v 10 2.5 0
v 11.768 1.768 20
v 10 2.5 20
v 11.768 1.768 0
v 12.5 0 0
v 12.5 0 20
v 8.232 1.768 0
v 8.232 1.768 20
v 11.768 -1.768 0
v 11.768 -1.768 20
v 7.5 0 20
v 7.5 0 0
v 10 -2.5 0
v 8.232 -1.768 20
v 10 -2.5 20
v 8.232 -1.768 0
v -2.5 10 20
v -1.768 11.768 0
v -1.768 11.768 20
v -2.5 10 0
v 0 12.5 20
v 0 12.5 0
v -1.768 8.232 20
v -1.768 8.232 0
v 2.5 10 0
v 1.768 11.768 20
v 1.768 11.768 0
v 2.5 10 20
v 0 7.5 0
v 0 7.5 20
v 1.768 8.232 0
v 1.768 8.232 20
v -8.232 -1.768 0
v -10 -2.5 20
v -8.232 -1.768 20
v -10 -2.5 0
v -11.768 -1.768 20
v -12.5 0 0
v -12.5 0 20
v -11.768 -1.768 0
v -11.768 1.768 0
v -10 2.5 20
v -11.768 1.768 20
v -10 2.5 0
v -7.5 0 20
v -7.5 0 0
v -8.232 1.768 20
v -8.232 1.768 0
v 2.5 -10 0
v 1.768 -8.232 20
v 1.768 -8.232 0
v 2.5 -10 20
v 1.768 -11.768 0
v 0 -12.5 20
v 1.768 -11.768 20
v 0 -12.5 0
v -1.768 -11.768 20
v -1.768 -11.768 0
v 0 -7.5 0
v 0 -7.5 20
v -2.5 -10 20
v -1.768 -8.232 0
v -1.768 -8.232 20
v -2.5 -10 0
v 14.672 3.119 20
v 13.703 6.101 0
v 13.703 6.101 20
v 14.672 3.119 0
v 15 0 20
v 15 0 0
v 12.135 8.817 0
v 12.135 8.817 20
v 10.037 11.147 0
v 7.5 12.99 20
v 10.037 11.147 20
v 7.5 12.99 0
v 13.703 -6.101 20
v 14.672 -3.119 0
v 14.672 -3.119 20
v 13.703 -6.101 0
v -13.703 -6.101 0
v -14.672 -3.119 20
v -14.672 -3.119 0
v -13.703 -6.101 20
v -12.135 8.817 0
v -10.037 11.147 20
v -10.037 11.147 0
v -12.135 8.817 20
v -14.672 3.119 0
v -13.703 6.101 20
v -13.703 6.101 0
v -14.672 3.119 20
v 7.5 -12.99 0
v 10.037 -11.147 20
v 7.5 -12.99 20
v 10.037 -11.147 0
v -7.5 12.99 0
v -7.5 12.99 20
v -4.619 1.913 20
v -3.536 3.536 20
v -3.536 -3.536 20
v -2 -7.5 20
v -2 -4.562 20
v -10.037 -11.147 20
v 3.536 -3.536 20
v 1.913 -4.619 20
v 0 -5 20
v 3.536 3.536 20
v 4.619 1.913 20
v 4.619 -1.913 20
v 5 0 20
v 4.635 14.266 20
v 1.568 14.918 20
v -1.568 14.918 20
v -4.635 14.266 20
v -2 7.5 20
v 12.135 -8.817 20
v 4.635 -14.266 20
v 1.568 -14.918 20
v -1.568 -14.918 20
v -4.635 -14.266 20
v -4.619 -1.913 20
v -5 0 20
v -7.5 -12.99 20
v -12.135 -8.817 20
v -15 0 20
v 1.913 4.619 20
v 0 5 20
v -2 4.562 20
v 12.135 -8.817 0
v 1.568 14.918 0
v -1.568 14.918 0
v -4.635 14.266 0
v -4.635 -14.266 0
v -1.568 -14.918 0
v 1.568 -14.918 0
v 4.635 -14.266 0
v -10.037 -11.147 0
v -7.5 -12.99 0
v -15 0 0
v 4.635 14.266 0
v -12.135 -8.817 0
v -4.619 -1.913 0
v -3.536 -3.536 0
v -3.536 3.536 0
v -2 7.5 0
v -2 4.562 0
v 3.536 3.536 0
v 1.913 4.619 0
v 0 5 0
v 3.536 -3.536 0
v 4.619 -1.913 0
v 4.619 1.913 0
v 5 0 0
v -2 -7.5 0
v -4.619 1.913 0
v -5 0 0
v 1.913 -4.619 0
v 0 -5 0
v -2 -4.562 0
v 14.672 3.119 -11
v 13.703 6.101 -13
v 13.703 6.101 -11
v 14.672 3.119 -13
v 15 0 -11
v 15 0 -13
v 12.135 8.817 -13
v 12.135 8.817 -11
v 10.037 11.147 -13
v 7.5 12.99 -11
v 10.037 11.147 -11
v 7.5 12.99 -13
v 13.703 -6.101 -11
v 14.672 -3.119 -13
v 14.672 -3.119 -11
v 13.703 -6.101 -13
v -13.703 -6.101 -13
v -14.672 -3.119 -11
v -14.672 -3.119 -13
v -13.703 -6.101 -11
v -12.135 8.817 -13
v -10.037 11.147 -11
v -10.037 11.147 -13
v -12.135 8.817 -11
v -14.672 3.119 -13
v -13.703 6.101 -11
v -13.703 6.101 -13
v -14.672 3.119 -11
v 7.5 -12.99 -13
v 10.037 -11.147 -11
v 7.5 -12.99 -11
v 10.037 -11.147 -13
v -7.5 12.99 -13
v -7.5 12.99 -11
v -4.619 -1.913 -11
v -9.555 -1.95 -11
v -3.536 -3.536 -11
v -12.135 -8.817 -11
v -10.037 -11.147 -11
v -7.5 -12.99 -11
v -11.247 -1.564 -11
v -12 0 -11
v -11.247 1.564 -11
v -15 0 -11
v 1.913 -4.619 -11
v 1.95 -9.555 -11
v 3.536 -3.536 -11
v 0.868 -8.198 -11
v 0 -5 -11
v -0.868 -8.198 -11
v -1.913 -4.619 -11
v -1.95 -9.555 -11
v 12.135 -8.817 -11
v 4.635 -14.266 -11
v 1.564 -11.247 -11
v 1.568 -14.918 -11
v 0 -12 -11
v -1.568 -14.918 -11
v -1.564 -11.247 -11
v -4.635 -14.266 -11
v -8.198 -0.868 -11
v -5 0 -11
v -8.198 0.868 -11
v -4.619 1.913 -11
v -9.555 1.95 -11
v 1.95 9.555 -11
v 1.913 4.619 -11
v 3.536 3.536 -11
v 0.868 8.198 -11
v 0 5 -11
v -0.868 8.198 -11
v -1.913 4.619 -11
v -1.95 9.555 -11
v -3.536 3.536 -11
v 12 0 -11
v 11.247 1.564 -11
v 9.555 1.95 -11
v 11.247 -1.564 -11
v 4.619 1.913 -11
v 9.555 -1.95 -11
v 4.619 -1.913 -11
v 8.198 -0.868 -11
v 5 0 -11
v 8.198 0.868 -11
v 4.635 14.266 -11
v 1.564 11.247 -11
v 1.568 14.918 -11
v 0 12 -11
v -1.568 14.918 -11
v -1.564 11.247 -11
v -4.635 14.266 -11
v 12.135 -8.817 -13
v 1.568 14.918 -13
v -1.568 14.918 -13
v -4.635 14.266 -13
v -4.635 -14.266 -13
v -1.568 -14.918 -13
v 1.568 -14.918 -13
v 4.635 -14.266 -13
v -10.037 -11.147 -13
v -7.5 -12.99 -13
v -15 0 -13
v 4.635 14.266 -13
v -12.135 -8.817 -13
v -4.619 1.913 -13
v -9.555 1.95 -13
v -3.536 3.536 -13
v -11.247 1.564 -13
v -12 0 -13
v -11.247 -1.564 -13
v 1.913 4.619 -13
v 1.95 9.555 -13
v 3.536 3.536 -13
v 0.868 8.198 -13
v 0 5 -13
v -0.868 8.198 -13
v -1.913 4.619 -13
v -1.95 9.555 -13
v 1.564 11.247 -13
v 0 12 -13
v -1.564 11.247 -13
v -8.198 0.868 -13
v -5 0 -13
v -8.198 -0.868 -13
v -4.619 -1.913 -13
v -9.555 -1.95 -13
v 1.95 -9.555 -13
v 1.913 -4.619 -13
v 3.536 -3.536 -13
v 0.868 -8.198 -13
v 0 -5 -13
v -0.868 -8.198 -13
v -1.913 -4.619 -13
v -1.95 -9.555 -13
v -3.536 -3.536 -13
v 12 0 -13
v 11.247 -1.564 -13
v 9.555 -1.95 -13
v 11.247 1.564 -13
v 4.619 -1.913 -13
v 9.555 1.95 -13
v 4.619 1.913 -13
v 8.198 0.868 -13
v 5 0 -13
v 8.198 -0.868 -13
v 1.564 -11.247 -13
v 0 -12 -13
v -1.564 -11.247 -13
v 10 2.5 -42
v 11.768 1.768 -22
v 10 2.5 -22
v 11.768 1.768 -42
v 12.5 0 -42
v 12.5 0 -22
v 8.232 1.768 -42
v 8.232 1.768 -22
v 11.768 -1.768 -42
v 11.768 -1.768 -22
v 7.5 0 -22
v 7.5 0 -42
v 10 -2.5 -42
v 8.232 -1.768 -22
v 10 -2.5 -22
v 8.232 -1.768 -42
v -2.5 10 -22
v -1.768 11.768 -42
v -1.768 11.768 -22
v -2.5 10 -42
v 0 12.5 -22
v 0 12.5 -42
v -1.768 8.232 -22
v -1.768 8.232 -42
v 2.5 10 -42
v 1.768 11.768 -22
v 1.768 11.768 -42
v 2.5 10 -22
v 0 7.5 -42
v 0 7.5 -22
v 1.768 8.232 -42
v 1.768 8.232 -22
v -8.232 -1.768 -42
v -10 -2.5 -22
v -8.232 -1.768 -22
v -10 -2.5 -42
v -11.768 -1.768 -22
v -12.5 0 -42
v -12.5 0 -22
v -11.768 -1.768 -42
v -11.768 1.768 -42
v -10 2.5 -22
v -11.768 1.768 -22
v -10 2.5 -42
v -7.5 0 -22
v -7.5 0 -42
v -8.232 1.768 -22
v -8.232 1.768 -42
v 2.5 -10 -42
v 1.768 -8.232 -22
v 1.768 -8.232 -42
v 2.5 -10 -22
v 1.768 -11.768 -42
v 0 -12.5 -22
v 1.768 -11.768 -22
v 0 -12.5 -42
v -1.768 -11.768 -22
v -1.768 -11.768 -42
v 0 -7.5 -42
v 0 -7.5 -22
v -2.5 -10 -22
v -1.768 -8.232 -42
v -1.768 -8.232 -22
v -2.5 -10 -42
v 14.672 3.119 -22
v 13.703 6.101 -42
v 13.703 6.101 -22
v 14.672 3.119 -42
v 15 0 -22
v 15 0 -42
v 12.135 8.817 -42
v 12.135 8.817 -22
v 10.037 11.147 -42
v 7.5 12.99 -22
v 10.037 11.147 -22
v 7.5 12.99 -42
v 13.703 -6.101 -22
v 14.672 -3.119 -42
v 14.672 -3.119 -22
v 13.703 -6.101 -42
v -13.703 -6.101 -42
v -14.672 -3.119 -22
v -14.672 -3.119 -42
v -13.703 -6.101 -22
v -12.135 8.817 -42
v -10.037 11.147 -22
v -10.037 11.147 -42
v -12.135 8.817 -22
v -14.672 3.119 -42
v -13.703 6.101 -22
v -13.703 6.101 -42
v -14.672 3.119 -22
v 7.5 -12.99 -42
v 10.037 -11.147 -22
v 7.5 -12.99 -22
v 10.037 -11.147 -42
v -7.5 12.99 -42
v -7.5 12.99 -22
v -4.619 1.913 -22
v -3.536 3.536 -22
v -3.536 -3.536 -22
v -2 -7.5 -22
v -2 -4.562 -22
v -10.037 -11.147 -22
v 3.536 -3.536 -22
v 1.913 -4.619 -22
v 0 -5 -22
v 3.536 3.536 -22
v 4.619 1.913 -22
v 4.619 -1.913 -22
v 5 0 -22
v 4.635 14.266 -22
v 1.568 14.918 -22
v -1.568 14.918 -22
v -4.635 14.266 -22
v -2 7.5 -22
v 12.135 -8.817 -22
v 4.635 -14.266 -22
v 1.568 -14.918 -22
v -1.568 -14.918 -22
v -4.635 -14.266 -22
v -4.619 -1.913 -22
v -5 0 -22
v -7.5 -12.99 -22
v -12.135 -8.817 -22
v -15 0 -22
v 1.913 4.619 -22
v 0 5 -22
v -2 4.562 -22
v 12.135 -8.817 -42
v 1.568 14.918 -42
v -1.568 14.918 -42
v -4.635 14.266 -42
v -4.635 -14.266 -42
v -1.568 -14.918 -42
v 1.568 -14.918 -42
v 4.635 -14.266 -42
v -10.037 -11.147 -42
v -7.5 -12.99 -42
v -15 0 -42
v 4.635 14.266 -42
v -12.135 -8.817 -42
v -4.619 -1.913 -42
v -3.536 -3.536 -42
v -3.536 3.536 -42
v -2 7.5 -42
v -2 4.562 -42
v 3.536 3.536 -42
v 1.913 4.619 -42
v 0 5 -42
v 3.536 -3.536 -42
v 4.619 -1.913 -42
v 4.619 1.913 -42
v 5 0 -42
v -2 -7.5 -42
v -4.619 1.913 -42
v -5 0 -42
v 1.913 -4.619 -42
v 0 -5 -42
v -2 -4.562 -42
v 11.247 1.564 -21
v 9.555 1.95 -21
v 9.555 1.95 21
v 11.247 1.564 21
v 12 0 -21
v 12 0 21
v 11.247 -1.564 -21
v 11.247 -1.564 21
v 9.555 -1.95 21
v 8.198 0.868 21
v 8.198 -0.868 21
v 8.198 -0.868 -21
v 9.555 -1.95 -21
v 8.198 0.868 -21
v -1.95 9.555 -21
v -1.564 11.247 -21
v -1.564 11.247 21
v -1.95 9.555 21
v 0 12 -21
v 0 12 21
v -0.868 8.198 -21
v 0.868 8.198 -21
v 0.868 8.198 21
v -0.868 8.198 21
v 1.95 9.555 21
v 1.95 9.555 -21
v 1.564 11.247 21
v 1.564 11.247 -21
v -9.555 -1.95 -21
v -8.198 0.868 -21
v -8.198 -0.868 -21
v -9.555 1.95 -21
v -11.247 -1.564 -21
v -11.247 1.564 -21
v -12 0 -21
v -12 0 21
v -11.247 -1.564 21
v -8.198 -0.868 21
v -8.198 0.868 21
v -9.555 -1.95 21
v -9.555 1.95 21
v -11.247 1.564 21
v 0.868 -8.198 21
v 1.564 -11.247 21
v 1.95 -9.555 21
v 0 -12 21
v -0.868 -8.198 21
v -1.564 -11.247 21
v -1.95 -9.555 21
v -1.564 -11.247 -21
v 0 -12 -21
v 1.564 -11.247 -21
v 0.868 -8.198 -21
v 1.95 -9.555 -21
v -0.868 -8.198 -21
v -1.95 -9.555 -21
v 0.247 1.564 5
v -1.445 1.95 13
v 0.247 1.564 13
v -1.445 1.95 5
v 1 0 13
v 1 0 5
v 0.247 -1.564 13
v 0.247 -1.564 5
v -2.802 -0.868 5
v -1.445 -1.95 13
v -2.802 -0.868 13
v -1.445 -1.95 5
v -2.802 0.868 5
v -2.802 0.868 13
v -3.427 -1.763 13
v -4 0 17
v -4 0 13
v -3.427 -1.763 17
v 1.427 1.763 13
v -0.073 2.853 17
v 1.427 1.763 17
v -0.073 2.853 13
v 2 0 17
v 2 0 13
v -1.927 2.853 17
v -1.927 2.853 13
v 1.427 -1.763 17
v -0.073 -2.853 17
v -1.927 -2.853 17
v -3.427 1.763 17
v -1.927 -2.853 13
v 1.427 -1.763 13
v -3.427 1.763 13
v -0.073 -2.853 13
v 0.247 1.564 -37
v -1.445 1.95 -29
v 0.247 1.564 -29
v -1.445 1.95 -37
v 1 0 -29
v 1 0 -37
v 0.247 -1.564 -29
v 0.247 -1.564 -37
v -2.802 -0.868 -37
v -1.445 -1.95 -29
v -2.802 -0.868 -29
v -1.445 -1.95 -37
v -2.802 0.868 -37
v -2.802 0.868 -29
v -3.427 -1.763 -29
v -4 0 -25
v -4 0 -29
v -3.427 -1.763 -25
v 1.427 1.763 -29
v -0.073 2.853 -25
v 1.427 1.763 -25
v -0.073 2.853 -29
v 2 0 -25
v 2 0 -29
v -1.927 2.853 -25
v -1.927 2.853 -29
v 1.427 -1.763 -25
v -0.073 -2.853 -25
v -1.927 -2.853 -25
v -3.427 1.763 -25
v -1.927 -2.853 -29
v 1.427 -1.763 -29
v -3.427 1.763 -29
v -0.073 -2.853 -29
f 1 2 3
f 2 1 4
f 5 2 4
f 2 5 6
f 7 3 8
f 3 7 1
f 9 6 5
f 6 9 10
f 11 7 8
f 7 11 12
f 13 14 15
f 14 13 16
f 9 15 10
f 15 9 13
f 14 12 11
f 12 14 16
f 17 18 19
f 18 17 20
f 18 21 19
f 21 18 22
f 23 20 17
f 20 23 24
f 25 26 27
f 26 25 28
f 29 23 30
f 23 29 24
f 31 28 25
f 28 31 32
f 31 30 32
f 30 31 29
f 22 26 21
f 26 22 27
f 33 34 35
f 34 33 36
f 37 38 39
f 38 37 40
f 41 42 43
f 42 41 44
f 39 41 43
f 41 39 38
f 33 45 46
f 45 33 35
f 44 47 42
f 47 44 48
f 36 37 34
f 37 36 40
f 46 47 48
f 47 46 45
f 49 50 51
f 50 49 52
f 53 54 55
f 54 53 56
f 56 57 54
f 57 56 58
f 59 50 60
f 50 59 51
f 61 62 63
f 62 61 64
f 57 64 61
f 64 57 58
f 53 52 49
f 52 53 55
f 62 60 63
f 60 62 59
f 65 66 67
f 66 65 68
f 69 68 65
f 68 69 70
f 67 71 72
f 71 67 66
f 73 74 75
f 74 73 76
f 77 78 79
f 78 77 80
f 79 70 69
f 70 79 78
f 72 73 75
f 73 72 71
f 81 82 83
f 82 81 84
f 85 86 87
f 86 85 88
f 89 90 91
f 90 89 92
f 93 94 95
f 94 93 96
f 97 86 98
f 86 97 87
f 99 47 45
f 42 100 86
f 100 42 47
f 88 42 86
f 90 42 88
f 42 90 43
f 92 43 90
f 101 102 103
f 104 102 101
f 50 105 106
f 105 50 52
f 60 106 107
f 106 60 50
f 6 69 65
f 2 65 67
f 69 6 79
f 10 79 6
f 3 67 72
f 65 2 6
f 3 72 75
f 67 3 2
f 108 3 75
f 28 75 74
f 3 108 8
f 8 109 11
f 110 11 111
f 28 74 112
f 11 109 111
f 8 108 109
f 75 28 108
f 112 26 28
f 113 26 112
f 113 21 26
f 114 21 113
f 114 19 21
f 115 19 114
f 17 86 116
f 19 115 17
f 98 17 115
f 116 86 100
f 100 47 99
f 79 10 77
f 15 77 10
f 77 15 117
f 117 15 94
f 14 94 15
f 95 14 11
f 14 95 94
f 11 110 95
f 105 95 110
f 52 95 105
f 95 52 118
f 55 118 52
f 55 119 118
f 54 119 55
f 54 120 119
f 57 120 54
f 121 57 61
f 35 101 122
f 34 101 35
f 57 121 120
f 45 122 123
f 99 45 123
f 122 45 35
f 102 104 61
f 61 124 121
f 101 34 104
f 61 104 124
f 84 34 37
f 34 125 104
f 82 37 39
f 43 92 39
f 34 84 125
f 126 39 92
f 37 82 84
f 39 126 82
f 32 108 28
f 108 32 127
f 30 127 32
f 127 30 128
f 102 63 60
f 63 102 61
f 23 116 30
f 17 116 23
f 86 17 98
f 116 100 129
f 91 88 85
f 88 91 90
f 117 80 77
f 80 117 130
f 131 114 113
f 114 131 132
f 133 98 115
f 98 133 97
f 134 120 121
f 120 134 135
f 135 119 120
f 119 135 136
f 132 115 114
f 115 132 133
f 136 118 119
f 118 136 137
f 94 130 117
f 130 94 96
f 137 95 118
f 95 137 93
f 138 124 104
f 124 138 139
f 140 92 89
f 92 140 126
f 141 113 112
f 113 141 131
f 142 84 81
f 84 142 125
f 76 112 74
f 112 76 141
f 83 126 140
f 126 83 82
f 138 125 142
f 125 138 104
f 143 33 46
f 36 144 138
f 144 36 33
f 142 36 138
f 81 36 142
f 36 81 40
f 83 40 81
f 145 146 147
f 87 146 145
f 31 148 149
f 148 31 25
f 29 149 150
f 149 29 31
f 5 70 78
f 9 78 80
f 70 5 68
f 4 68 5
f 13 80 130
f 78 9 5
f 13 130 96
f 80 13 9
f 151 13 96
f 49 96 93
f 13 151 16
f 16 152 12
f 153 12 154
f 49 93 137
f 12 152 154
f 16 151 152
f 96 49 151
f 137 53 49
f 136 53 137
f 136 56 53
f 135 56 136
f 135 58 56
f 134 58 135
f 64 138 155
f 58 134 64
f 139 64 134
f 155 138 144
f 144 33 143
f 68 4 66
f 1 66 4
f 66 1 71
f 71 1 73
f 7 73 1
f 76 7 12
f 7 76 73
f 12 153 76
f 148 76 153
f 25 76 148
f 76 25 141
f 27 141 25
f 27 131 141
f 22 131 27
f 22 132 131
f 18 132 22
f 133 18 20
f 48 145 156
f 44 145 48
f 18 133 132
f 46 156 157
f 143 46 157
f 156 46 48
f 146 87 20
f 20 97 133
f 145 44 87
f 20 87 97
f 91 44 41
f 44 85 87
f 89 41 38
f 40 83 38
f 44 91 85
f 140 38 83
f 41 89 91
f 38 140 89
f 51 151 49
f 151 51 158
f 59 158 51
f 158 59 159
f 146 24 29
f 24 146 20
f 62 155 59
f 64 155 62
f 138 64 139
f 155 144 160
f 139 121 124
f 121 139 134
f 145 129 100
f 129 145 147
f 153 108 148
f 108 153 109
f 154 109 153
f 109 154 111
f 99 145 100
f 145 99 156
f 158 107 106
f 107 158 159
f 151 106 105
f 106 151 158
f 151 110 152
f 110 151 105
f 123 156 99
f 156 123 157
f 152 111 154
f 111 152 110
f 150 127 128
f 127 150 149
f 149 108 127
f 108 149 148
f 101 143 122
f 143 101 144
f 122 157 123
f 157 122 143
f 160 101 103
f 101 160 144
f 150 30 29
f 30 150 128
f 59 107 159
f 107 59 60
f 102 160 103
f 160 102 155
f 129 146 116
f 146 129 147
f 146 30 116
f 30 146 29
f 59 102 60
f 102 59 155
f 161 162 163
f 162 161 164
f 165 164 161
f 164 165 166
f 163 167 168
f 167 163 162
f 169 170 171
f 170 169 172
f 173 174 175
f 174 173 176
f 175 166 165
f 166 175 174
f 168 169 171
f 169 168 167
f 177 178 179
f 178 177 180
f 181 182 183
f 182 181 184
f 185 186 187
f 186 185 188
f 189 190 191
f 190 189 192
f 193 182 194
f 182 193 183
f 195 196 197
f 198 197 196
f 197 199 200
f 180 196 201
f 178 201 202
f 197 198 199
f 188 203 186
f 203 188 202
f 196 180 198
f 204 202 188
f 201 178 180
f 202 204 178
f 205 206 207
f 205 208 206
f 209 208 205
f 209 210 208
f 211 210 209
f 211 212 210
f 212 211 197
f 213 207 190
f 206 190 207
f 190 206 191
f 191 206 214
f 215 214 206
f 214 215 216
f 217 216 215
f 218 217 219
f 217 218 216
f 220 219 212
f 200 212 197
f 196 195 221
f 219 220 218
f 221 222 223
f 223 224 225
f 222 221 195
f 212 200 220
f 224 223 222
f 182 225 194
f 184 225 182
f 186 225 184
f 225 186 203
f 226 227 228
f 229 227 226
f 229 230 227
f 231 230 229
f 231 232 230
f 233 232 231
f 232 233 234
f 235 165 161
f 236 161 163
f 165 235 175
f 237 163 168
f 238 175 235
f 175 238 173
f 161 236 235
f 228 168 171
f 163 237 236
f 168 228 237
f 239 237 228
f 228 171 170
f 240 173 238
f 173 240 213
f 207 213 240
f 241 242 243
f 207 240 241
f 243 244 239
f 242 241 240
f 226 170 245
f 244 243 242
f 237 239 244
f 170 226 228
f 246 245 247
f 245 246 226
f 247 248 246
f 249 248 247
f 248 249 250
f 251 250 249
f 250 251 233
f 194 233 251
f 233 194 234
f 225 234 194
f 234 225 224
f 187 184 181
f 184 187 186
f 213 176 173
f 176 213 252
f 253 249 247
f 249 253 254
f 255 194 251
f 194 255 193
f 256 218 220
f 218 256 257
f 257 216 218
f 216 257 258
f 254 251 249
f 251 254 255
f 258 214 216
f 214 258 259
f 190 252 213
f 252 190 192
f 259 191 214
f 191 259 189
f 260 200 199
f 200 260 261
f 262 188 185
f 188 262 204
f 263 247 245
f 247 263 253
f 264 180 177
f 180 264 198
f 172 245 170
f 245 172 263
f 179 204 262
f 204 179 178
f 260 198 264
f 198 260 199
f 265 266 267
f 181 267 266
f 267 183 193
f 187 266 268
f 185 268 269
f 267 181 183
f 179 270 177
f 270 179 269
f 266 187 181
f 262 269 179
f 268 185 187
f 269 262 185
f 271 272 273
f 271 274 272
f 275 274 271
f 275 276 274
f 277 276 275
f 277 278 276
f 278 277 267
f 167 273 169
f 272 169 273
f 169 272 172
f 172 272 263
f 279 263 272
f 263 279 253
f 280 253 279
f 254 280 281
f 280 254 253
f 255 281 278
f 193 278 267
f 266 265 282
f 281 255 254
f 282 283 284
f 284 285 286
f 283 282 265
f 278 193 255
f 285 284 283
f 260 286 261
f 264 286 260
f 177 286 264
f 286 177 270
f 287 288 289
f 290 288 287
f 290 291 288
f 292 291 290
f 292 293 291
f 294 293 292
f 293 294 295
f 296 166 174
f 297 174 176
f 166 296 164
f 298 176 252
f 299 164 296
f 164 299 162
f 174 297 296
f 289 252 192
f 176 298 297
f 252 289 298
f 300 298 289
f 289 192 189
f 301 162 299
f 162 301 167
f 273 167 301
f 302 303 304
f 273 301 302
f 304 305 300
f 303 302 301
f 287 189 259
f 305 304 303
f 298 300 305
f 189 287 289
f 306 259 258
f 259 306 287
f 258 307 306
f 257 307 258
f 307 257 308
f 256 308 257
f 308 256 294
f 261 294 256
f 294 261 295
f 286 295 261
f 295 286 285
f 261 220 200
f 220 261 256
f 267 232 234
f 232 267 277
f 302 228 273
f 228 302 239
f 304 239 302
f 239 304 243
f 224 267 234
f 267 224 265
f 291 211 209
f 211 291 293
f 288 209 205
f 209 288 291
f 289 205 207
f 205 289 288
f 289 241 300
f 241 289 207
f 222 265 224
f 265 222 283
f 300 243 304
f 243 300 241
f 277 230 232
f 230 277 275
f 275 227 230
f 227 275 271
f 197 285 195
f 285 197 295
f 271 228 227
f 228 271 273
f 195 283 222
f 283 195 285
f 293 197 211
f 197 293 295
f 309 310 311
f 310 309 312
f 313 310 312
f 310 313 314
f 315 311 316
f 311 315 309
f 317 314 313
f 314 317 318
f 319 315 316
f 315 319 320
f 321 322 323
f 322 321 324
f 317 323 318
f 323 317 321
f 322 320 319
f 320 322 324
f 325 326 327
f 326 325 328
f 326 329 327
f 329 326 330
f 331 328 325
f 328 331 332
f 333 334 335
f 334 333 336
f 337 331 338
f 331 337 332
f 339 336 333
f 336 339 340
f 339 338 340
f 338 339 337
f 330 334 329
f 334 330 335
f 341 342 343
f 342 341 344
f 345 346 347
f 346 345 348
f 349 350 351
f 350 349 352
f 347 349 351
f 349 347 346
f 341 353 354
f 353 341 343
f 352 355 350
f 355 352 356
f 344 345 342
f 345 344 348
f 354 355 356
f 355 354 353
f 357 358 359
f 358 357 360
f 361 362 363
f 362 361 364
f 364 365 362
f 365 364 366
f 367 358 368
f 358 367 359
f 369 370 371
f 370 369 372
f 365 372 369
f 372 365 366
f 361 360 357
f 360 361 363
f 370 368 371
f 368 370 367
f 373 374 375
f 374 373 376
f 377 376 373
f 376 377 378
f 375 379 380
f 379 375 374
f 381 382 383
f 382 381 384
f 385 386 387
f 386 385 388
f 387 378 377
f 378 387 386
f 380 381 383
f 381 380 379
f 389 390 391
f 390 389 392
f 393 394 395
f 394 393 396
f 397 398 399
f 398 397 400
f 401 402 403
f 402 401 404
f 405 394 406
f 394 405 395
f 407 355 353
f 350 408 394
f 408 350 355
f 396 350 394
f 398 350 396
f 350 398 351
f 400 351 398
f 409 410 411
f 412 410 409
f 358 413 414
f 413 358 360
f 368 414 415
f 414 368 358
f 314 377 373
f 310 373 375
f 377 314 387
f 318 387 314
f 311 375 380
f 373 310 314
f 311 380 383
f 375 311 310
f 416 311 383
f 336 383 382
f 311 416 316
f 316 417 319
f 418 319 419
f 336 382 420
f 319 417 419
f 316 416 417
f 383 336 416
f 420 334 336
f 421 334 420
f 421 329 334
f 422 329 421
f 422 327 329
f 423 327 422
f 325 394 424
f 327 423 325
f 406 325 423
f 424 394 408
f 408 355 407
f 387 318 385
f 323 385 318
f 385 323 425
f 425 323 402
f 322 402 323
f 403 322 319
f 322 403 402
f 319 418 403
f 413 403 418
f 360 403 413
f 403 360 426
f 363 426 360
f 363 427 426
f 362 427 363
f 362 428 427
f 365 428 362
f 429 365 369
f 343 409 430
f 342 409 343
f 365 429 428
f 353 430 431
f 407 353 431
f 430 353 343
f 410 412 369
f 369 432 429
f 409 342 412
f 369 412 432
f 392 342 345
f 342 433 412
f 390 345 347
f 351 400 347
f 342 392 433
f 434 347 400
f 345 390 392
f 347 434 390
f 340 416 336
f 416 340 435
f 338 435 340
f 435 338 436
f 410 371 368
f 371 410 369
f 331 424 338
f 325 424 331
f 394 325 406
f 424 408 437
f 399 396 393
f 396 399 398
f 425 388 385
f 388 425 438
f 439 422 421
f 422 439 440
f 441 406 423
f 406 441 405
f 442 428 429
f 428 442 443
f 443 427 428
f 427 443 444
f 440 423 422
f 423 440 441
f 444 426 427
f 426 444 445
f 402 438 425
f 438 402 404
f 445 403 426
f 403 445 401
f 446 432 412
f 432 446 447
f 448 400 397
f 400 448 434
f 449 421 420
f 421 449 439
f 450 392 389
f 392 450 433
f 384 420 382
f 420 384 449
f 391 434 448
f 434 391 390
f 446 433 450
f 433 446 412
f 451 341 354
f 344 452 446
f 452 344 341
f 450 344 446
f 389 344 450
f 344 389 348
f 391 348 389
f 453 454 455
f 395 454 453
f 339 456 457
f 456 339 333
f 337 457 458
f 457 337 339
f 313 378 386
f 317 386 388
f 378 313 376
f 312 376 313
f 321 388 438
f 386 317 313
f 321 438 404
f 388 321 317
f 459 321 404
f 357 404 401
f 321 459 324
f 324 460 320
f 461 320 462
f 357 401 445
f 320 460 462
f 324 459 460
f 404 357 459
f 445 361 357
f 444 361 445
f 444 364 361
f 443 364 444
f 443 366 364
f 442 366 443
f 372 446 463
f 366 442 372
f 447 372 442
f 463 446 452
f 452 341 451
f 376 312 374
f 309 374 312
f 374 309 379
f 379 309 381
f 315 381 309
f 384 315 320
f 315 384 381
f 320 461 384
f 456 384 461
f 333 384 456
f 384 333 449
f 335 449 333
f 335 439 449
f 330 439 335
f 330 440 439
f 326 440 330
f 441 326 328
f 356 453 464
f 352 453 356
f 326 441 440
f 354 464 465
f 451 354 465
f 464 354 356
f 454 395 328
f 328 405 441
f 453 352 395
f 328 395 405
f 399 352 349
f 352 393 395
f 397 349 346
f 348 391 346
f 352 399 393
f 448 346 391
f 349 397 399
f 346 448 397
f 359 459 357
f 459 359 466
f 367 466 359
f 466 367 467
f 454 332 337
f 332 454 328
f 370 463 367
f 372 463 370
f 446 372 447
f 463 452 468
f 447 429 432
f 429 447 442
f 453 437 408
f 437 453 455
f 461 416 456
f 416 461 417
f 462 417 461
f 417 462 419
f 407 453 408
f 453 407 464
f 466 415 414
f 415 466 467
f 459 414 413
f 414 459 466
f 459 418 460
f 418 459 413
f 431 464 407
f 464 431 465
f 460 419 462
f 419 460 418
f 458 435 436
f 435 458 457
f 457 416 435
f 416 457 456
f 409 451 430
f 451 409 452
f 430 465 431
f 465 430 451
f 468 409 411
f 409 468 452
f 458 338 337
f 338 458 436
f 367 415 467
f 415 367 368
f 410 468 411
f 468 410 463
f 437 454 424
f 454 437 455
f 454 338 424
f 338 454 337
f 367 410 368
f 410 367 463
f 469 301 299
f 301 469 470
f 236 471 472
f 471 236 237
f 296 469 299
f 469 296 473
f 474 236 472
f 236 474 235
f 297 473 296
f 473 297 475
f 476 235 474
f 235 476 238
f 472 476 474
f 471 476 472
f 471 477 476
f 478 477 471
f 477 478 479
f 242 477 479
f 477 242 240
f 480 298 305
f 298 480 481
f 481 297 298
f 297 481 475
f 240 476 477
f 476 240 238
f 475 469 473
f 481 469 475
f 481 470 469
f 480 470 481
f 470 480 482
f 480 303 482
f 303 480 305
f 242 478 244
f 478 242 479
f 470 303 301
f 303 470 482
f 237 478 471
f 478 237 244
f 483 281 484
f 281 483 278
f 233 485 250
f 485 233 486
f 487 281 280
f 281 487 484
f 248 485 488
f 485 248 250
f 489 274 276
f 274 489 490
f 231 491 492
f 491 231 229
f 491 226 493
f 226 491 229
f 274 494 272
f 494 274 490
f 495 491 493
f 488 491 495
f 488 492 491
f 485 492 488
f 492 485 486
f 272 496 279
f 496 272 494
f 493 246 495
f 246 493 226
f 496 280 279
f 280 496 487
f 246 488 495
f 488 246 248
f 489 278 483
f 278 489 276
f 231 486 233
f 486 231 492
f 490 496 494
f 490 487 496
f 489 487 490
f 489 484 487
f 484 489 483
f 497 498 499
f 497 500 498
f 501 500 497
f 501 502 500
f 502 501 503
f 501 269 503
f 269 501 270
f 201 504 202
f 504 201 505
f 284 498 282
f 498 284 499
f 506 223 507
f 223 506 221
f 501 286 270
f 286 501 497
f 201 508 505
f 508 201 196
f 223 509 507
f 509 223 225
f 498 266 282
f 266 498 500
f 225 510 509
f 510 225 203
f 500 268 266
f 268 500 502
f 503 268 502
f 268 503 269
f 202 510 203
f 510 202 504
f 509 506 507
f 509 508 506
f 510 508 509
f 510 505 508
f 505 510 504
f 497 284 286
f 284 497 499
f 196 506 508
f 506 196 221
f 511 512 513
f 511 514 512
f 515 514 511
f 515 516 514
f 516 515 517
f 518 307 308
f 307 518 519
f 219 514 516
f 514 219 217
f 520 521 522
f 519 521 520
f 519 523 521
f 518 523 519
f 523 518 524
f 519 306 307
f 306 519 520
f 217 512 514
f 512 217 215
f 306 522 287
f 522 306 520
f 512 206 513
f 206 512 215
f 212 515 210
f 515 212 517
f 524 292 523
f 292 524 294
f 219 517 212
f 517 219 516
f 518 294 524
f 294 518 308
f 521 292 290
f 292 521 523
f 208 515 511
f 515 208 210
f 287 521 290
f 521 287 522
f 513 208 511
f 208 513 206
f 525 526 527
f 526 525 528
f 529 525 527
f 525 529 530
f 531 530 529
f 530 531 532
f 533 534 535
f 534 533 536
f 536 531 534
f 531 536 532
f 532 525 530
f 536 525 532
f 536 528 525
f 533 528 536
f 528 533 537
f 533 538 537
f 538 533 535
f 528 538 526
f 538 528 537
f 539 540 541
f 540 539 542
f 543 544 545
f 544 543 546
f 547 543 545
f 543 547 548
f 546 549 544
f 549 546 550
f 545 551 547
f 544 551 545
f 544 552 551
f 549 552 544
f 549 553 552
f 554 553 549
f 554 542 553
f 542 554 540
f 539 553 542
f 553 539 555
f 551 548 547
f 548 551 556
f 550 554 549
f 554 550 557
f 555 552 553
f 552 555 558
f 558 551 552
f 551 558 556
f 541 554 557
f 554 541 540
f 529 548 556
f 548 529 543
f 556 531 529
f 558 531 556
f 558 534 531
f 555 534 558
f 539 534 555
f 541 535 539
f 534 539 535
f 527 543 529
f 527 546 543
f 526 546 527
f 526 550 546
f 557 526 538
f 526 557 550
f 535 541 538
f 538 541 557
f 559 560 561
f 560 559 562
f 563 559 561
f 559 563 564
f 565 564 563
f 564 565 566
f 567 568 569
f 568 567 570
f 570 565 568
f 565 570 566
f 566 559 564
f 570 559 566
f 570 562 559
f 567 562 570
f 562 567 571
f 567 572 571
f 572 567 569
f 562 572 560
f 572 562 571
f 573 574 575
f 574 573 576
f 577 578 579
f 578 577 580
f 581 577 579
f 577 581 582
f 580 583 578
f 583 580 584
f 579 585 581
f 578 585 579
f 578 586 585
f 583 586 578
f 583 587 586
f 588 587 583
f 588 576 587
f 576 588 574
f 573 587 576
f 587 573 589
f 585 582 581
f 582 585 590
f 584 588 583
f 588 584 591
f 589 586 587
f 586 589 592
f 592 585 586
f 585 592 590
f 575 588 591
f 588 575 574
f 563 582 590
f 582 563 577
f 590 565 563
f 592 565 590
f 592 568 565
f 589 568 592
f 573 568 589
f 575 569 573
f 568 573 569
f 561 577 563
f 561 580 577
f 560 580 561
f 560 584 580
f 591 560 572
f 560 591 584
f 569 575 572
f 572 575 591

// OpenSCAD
// Parameters
coupling_diameter = 30;
coupling_height = 20;
bore_diameter = 10;
fastening_hole_diameter = 5;
fastening_hole_offset = 10;
slit_width = 2;
slit_depth = coupling_diameter / 2;
flexible_element_thickness = 2;
screw_diameter = 4;
screw_head_diameter = 6;
screw_length = 10;

// Coupling Half Module
module coupling_half() {
    difference() {
        cylinder(d=coupling_diameter, h=coupling_height, center=true);
        
        // Central bore
        cylinder(d=bore_diameter, h=coupling_height + 2, center=true);
        
        // Fastening holes
        for (i = [0:3]) {
            rotate([0, 0, i * 90])
                translate([fastening_hole_offset, 0, 0])
                    cylinder(d=fastening_hole_diameter, h=coupling_height + 2, center=true);
        }
        
        // Slit for clamping
        translate([-slit_width / 2, 0, 0])
            cube([slit_width, slit_depth, coupling_height + 2], center=true);
    }
}

// Flexible Element Module
module flexible_element() {
    difference() {
        cylinder(d=coupling_diameter, h=flexible_element_thickness, center=true);
        cylinder(d=bore_diameter, h=flexible_element_thickness + 2, center=true);
    }
}

// Clamping Screw Module
module clamping_screw() {
    union() {
        cylinder(d=screw_diameter, h=screw_length, center=true);
        translate([0, 0, screw_length / 2])
            cylinder(d=screw_head_diameter, h=screw_diameter, center=true);
    }
}

// Fastening Screw Module
module fastening_screw() {
    cylinder(d=screw_diameter, h=coupling_height * 2 + flexible_element_thickness, center=true);
}

// Assembly
module coupling_assembly() {
    translate([0, 0, coupling_height / 2])
        coupling_half();
    
    translate([0, 0, -coupling_height / 2 - flexible_element_thickness])
        flexible_element();
    
    translate([0, 0, -coupling_height - flexible_element_thickness - coupling_height / 2])
        coupling_half();
    
    // Fastening screws
    for (i = [0:3]) {
        rotate([0, 0, i * 90])
            translate([fastening_hole_offset, 0, 0])
                fastening_screw();
    }
    
    // Clamping screws
    translate([-slit_width / 2, 0, coupling_height / 2])
        clamping_screw();
    
    translate([-slit_width / 2, 0, -coupling_height - flexible_element_thickness - coupling_height / 2])
        clamping_screw();
}

// Render the assembly
coupling_assembly();
